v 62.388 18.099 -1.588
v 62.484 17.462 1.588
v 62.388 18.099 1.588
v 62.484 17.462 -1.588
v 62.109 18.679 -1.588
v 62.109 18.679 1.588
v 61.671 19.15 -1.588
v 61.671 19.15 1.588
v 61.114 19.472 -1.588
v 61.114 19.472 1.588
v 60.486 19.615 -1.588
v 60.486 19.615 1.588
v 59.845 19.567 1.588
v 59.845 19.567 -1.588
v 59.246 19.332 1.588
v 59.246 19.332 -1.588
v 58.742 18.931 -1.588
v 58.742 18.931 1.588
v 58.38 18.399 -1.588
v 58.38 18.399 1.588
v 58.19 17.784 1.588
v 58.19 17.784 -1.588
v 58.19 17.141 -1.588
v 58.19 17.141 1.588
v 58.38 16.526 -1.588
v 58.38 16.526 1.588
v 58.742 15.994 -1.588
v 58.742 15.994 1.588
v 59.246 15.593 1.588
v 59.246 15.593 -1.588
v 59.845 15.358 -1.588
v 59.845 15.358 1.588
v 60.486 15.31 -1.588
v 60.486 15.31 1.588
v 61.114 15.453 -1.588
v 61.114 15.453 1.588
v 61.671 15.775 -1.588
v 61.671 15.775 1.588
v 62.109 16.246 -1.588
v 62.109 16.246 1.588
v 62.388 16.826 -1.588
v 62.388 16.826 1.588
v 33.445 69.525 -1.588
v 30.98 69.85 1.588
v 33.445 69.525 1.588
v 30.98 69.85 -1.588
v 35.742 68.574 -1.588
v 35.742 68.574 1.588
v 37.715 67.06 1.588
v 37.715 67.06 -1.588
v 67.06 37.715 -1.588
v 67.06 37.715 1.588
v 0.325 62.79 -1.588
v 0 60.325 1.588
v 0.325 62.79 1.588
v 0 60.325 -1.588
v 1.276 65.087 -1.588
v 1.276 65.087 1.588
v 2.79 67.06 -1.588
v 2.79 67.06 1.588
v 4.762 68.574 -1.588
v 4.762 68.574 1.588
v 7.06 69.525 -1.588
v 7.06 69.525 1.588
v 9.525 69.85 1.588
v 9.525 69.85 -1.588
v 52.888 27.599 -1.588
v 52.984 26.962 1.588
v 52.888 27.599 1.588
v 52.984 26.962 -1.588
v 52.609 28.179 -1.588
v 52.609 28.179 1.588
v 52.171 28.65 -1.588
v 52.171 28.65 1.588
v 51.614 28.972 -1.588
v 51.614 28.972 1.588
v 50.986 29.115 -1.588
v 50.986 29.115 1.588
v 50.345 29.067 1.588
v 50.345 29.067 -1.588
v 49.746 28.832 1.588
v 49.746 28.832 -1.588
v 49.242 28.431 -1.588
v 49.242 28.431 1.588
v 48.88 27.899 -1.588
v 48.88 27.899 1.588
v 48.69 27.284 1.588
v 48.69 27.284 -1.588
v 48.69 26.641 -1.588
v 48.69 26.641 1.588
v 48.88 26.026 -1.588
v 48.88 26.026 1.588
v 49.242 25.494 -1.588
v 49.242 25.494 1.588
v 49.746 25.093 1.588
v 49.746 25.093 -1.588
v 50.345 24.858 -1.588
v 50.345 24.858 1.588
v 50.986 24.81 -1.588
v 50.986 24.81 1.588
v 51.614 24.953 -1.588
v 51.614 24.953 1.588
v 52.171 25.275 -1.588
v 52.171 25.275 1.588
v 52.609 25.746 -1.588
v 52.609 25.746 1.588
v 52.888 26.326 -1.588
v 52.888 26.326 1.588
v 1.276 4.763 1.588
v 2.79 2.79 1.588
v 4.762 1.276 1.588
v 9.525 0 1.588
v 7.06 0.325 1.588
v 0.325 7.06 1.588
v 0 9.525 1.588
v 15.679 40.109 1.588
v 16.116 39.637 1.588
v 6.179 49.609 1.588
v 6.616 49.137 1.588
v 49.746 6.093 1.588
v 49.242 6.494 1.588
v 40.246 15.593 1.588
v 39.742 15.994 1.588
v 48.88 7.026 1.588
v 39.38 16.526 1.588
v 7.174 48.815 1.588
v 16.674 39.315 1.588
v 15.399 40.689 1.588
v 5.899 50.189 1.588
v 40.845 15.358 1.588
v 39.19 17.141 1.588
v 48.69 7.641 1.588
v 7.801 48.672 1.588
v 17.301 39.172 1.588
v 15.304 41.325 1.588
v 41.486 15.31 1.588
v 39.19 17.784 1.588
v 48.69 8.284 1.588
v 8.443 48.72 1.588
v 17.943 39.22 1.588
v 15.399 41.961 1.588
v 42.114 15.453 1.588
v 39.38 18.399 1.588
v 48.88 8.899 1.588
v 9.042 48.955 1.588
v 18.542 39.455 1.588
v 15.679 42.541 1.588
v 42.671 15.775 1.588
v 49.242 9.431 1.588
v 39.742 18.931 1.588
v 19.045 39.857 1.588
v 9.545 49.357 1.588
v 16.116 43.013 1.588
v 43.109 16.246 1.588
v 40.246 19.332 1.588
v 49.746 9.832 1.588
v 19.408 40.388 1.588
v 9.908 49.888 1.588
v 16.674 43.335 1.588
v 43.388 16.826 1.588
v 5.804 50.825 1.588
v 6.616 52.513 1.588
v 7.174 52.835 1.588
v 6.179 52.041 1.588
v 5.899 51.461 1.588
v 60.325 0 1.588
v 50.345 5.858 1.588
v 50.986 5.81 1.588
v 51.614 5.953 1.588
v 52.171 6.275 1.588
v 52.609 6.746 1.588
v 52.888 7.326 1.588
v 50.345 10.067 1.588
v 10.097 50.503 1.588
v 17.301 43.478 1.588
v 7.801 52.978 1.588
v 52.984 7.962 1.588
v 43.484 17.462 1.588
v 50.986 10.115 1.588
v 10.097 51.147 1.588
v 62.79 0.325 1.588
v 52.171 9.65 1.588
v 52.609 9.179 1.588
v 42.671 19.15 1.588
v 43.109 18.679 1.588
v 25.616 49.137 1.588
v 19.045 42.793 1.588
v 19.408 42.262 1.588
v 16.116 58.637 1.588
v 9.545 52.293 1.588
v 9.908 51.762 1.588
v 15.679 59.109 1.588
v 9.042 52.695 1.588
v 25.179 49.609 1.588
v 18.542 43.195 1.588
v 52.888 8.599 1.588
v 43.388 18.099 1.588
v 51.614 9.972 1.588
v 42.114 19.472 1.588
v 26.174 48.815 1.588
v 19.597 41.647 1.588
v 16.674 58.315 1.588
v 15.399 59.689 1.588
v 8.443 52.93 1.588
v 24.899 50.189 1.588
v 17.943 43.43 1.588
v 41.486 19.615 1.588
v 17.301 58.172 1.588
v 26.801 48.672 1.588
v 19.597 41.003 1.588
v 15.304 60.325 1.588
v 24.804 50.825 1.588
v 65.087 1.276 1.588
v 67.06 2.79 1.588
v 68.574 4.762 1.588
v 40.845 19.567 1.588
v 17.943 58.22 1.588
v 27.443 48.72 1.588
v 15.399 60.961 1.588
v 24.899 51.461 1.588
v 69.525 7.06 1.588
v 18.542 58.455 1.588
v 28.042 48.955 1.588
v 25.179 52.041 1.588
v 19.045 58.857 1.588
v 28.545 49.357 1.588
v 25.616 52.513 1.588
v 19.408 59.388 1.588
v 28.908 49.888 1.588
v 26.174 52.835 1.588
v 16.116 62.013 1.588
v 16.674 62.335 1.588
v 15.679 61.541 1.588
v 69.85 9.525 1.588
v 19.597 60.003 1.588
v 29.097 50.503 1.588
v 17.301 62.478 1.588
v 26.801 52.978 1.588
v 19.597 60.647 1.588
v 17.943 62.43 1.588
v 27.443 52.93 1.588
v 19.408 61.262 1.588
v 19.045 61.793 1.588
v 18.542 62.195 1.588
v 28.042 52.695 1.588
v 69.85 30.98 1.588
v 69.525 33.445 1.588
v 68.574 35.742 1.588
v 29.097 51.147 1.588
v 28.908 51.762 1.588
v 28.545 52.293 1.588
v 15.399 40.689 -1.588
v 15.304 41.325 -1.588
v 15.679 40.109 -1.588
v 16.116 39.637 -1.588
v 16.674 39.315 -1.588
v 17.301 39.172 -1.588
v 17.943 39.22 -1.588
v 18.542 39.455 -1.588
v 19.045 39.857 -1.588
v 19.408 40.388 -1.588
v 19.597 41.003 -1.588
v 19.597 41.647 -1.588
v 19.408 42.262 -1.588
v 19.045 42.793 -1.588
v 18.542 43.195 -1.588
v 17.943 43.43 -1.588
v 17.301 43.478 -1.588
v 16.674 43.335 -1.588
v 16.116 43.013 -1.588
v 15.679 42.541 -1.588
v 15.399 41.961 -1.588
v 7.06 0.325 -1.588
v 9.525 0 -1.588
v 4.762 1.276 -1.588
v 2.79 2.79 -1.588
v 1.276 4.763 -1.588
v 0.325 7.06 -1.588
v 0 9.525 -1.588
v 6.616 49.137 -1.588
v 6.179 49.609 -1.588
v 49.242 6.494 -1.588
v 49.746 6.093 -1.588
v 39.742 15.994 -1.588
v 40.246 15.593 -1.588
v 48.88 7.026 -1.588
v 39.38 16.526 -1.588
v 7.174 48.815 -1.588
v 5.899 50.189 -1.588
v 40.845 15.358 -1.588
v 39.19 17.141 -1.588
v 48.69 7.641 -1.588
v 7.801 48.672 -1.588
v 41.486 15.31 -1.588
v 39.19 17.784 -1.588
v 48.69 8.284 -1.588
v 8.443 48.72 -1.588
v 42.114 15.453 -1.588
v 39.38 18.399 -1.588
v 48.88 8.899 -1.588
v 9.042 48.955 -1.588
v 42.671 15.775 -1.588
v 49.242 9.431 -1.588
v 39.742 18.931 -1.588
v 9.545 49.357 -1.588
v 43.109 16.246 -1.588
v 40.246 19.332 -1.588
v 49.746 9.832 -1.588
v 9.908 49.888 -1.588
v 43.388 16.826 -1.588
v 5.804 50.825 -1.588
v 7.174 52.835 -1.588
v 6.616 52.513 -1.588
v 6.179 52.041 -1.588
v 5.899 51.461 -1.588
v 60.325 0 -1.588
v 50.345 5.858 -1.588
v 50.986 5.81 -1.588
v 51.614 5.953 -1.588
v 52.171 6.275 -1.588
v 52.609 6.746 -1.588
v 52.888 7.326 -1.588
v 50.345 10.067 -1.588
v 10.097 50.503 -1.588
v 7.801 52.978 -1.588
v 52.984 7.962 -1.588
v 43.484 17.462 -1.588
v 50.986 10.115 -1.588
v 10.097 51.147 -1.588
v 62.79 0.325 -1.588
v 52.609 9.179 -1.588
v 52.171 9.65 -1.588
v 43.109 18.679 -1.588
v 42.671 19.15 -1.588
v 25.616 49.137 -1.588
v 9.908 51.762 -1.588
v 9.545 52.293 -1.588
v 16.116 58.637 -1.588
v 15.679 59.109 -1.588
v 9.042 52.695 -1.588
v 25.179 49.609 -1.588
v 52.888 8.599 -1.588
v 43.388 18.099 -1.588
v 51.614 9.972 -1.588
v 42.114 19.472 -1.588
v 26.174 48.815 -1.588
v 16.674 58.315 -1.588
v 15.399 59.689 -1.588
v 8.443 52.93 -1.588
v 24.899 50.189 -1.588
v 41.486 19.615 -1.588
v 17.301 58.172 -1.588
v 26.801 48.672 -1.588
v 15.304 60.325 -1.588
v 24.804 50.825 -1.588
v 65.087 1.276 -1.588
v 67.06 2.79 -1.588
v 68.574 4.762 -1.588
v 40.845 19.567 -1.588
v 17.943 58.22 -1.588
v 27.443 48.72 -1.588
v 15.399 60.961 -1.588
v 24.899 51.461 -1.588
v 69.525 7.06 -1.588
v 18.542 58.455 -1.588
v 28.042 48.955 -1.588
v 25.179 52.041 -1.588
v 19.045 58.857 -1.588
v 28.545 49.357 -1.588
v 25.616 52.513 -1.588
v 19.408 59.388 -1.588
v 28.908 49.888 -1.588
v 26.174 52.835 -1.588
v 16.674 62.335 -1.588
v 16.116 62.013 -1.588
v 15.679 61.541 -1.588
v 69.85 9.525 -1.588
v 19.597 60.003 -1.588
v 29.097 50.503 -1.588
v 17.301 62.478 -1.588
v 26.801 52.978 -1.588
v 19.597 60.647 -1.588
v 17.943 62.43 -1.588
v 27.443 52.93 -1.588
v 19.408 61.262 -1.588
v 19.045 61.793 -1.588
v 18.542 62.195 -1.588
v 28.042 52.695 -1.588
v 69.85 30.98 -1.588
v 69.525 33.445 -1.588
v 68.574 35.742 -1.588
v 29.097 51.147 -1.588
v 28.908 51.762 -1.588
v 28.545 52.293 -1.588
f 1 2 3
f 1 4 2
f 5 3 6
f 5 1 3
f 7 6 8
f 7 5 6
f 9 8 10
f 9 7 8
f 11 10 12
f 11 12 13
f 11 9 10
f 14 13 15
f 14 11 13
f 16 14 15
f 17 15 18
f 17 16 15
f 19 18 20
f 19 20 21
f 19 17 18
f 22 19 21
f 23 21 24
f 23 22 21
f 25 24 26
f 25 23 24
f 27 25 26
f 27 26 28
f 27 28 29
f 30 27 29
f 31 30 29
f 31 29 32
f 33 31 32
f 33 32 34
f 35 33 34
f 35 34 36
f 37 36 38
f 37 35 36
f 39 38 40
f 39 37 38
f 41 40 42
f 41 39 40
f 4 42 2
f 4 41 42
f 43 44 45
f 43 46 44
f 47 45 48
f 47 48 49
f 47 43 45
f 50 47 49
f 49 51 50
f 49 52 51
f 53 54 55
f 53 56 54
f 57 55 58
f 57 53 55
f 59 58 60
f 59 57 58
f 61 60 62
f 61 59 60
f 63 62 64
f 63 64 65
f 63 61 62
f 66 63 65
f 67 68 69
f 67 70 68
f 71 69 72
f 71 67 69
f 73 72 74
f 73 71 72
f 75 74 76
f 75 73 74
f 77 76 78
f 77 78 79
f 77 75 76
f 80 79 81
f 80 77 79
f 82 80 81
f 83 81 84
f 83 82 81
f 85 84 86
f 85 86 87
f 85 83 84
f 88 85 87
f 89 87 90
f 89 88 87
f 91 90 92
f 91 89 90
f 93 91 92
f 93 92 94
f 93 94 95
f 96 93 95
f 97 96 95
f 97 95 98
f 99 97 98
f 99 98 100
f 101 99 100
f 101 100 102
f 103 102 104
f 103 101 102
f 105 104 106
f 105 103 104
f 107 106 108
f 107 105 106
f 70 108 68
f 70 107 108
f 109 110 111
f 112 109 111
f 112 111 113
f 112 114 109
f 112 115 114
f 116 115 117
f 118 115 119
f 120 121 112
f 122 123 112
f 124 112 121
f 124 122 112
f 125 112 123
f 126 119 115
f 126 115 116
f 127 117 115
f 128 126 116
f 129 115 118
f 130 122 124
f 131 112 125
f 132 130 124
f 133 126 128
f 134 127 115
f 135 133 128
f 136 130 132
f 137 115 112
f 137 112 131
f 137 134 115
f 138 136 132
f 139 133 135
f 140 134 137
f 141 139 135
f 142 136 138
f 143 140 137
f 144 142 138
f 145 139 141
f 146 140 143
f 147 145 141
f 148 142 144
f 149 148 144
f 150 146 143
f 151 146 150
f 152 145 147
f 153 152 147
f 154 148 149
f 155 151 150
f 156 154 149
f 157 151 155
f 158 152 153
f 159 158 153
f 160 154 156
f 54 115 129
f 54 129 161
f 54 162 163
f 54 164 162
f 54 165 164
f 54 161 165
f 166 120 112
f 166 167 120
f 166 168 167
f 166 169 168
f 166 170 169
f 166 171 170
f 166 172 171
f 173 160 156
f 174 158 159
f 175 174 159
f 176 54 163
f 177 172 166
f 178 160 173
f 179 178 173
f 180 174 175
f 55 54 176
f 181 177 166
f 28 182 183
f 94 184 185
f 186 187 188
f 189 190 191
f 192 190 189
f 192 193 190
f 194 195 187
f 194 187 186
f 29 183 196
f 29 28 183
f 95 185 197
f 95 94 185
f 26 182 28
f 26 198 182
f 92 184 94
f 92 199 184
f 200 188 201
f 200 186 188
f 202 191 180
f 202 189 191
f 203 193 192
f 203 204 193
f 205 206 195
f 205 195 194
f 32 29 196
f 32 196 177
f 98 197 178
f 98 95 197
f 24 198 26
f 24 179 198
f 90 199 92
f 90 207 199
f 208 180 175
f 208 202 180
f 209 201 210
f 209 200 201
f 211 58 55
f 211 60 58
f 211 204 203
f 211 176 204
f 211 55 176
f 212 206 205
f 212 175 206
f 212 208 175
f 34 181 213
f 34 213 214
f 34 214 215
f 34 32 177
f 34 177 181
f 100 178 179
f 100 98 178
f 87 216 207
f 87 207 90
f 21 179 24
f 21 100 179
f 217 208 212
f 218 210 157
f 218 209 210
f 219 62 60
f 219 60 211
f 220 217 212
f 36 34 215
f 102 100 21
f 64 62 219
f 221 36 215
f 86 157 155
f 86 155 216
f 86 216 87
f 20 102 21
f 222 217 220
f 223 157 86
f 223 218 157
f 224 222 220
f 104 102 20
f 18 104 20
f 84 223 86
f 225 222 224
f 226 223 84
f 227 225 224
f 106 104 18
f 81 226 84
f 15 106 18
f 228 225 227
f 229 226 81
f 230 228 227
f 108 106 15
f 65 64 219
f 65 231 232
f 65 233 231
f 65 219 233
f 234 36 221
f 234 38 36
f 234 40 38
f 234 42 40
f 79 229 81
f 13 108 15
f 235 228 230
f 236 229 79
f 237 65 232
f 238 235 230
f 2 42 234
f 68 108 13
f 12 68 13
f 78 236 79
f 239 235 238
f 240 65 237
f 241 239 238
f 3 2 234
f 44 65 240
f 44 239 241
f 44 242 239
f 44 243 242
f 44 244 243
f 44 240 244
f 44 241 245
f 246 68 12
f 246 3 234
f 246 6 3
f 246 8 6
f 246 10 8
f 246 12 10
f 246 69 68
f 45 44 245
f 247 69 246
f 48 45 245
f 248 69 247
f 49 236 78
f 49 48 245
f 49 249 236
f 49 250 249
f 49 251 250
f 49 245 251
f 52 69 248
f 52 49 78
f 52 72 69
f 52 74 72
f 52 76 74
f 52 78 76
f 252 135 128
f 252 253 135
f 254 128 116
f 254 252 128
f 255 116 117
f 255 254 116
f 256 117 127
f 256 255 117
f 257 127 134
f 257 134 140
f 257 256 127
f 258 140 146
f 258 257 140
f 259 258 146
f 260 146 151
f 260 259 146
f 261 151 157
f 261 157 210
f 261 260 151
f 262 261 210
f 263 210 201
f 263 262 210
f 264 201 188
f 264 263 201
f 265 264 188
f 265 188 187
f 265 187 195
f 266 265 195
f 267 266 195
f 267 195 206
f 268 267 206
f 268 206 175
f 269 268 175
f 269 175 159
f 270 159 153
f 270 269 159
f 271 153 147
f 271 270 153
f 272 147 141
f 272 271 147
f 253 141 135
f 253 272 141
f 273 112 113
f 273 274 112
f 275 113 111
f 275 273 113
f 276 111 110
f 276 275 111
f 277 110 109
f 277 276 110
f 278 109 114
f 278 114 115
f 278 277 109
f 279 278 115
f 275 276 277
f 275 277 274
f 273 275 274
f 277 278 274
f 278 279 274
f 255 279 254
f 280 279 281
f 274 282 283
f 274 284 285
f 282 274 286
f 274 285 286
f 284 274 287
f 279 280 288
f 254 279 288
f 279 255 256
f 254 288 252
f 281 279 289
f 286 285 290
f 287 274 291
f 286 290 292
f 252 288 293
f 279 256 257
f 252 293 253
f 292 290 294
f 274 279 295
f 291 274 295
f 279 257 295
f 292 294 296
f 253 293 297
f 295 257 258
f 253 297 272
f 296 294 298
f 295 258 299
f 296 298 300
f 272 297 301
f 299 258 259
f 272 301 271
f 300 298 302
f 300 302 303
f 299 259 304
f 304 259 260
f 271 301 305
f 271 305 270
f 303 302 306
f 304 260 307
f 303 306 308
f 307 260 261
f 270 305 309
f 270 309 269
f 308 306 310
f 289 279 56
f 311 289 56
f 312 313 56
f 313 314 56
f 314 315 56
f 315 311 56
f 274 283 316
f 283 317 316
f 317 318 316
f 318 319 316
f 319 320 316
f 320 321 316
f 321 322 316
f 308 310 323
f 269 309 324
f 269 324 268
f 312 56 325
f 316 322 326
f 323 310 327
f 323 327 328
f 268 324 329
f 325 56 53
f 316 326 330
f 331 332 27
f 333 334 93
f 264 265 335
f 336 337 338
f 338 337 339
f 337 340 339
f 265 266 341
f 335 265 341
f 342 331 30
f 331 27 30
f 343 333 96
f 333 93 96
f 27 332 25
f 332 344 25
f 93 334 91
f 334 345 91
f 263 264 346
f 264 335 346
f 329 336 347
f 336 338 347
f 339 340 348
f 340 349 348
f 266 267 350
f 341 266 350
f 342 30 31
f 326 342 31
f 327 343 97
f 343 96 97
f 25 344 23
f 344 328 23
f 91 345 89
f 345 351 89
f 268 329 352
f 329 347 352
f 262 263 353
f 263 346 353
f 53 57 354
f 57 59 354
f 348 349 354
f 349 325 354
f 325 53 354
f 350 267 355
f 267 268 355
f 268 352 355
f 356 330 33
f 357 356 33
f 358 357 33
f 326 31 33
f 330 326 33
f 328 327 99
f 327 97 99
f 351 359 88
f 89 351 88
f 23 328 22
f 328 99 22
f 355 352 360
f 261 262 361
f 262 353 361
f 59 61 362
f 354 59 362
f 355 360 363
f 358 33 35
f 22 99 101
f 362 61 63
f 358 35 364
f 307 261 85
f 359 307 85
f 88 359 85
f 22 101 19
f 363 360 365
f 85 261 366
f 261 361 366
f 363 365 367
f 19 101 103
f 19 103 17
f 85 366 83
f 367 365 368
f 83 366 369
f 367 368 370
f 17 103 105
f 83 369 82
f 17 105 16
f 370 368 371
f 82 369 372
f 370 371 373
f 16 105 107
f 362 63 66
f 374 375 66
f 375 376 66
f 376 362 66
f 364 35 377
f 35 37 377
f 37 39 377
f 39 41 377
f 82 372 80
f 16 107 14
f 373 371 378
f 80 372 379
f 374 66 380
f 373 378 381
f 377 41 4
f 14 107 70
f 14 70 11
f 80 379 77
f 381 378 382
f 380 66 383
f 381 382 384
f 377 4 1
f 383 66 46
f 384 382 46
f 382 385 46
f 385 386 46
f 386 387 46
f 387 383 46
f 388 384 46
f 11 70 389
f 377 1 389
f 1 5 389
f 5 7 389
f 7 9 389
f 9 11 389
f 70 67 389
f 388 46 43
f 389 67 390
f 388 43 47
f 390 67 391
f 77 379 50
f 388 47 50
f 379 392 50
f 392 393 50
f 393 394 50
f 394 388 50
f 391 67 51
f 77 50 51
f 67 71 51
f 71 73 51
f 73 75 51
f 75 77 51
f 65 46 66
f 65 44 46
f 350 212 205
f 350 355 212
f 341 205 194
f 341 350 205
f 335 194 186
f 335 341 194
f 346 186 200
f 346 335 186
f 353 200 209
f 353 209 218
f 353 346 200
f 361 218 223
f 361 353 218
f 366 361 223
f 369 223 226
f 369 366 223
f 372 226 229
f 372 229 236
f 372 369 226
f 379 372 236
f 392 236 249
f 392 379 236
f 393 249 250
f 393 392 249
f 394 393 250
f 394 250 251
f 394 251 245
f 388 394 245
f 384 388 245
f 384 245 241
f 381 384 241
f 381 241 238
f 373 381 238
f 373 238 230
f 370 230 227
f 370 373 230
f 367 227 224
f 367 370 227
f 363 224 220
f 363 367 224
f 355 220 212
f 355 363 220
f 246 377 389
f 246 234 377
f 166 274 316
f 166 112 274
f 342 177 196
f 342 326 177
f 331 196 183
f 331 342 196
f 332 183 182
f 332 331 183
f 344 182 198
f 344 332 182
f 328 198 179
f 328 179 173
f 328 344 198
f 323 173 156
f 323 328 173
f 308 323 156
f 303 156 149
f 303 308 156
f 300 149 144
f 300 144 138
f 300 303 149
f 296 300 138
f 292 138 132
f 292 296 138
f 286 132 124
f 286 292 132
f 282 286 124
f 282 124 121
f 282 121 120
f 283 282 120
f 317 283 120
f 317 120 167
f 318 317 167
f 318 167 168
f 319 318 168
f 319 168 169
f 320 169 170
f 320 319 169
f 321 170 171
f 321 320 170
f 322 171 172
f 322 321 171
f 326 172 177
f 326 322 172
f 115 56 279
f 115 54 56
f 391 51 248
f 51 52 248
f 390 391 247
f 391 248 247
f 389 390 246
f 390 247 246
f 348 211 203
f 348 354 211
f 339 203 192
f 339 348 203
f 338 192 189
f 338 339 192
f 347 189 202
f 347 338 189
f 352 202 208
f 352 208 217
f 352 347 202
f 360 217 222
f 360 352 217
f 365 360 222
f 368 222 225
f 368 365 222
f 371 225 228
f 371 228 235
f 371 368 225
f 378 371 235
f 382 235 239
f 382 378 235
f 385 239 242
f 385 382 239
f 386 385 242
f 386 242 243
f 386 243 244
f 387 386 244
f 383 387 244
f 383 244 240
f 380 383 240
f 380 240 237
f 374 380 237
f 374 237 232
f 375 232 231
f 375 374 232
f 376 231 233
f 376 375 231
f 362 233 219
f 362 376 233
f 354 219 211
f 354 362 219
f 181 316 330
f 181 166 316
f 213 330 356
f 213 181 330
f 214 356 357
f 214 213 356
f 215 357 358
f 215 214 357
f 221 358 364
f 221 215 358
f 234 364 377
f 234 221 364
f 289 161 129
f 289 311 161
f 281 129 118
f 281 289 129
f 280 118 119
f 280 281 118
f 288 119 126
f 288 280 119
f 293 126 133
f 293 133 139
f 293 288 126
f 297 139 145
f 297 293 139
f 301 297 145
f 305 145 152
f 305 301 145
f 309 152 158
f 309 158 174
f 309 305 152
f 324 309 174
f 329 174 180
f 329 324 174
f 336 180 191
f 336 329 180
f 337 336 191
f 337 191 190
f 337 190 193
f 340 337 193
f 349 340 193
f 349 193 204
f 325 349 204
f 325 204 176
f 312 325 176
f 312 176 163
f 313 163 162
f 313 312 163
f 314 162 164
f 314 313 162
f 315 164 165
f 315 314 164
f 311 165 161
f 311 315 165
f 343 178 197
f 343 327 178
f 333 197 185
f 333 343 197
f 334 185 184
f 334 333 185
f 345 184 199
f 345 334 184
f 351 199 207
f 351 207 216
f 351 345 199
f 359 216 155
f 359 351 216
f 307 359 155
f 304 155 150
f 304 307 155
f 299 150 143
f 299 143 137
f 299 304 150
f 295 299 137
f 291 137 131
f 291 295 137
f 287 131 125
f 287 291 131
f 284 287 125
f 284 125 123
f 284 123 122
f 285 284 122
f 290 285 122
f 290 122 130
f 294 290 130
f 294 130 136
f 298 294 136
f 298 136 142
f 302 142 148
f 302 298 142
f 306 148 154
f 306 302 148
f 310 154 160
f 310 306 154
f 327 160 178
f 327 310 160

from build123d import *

# Parameters (mm, degrees)
SKETCH1_R           = 2.159
BOSS_EXTRUDE1_DEPTH = 1.5875
FILLET1_R           = 9.525


with BuildPart() as part:
    # Sketch1 → Boss-Extrude1 (new, symmetric)
    with BuildSketch(Plane.XY):
        Polygon((0, 0), (69.85, 0), (69.85, 34.925), (34.925, 69.85), (0, 69.85), align=None)
        with Locations((50.825, 26.9625)):
            Circle(SKETCH1_R, mode=Mode.SUBTRACT)
        with Locations(Location((26.9625, 50.825, 0), (0, 0, 180))):
            Circle(SKETCH1_R, mode=Mode.SUBTRACT)
        with Locations((50.825, 7.9625)):
            Circle(SKETCH1_R, mode=Mode.SUBTRACT)
        with Locations(Location((7.9625, 50.825, 0), (0, 0, 180))):
            Circle(SKETCH1_R, mode=Mode.SUBTRACT)
        with Locations((41.325, 17.4625)):
            Circle(SKETCH1_R, mode=Mode.SUBTRACT)
        with Locations(Location((17.4625, 41.325, 0), (0, 0, 180))):
            Circle(SKETCH1_R, mode=Mode.SUBTRACT)
        with Locations((60.325, 17.4625)):
            Circle(SKETCH1_R, mode=Mode.SUBTRACT)
        with Locations(Location((17.4625, 60.325, 0), (0, 0, 180))):
            Circle(SKETCH1_R, mode=Mode.SUBTRACT)
    extrude(amount=BOSS_EXTRUDE1_DEPTH, both=True)

    # Fillet1
    fillet1_edges = [part.edges().sort_by_distance(p)[0] for p in [
        (0, 69.85, 0),
        (34.925, 69.85, 0),
        (69.85, 34.925, 0),
        (69.85, 0, 0),
        (0, 0, 0),
    ]]
    fillet(fillet1_edges, radius=FILLET1_R)


solid = part.part
